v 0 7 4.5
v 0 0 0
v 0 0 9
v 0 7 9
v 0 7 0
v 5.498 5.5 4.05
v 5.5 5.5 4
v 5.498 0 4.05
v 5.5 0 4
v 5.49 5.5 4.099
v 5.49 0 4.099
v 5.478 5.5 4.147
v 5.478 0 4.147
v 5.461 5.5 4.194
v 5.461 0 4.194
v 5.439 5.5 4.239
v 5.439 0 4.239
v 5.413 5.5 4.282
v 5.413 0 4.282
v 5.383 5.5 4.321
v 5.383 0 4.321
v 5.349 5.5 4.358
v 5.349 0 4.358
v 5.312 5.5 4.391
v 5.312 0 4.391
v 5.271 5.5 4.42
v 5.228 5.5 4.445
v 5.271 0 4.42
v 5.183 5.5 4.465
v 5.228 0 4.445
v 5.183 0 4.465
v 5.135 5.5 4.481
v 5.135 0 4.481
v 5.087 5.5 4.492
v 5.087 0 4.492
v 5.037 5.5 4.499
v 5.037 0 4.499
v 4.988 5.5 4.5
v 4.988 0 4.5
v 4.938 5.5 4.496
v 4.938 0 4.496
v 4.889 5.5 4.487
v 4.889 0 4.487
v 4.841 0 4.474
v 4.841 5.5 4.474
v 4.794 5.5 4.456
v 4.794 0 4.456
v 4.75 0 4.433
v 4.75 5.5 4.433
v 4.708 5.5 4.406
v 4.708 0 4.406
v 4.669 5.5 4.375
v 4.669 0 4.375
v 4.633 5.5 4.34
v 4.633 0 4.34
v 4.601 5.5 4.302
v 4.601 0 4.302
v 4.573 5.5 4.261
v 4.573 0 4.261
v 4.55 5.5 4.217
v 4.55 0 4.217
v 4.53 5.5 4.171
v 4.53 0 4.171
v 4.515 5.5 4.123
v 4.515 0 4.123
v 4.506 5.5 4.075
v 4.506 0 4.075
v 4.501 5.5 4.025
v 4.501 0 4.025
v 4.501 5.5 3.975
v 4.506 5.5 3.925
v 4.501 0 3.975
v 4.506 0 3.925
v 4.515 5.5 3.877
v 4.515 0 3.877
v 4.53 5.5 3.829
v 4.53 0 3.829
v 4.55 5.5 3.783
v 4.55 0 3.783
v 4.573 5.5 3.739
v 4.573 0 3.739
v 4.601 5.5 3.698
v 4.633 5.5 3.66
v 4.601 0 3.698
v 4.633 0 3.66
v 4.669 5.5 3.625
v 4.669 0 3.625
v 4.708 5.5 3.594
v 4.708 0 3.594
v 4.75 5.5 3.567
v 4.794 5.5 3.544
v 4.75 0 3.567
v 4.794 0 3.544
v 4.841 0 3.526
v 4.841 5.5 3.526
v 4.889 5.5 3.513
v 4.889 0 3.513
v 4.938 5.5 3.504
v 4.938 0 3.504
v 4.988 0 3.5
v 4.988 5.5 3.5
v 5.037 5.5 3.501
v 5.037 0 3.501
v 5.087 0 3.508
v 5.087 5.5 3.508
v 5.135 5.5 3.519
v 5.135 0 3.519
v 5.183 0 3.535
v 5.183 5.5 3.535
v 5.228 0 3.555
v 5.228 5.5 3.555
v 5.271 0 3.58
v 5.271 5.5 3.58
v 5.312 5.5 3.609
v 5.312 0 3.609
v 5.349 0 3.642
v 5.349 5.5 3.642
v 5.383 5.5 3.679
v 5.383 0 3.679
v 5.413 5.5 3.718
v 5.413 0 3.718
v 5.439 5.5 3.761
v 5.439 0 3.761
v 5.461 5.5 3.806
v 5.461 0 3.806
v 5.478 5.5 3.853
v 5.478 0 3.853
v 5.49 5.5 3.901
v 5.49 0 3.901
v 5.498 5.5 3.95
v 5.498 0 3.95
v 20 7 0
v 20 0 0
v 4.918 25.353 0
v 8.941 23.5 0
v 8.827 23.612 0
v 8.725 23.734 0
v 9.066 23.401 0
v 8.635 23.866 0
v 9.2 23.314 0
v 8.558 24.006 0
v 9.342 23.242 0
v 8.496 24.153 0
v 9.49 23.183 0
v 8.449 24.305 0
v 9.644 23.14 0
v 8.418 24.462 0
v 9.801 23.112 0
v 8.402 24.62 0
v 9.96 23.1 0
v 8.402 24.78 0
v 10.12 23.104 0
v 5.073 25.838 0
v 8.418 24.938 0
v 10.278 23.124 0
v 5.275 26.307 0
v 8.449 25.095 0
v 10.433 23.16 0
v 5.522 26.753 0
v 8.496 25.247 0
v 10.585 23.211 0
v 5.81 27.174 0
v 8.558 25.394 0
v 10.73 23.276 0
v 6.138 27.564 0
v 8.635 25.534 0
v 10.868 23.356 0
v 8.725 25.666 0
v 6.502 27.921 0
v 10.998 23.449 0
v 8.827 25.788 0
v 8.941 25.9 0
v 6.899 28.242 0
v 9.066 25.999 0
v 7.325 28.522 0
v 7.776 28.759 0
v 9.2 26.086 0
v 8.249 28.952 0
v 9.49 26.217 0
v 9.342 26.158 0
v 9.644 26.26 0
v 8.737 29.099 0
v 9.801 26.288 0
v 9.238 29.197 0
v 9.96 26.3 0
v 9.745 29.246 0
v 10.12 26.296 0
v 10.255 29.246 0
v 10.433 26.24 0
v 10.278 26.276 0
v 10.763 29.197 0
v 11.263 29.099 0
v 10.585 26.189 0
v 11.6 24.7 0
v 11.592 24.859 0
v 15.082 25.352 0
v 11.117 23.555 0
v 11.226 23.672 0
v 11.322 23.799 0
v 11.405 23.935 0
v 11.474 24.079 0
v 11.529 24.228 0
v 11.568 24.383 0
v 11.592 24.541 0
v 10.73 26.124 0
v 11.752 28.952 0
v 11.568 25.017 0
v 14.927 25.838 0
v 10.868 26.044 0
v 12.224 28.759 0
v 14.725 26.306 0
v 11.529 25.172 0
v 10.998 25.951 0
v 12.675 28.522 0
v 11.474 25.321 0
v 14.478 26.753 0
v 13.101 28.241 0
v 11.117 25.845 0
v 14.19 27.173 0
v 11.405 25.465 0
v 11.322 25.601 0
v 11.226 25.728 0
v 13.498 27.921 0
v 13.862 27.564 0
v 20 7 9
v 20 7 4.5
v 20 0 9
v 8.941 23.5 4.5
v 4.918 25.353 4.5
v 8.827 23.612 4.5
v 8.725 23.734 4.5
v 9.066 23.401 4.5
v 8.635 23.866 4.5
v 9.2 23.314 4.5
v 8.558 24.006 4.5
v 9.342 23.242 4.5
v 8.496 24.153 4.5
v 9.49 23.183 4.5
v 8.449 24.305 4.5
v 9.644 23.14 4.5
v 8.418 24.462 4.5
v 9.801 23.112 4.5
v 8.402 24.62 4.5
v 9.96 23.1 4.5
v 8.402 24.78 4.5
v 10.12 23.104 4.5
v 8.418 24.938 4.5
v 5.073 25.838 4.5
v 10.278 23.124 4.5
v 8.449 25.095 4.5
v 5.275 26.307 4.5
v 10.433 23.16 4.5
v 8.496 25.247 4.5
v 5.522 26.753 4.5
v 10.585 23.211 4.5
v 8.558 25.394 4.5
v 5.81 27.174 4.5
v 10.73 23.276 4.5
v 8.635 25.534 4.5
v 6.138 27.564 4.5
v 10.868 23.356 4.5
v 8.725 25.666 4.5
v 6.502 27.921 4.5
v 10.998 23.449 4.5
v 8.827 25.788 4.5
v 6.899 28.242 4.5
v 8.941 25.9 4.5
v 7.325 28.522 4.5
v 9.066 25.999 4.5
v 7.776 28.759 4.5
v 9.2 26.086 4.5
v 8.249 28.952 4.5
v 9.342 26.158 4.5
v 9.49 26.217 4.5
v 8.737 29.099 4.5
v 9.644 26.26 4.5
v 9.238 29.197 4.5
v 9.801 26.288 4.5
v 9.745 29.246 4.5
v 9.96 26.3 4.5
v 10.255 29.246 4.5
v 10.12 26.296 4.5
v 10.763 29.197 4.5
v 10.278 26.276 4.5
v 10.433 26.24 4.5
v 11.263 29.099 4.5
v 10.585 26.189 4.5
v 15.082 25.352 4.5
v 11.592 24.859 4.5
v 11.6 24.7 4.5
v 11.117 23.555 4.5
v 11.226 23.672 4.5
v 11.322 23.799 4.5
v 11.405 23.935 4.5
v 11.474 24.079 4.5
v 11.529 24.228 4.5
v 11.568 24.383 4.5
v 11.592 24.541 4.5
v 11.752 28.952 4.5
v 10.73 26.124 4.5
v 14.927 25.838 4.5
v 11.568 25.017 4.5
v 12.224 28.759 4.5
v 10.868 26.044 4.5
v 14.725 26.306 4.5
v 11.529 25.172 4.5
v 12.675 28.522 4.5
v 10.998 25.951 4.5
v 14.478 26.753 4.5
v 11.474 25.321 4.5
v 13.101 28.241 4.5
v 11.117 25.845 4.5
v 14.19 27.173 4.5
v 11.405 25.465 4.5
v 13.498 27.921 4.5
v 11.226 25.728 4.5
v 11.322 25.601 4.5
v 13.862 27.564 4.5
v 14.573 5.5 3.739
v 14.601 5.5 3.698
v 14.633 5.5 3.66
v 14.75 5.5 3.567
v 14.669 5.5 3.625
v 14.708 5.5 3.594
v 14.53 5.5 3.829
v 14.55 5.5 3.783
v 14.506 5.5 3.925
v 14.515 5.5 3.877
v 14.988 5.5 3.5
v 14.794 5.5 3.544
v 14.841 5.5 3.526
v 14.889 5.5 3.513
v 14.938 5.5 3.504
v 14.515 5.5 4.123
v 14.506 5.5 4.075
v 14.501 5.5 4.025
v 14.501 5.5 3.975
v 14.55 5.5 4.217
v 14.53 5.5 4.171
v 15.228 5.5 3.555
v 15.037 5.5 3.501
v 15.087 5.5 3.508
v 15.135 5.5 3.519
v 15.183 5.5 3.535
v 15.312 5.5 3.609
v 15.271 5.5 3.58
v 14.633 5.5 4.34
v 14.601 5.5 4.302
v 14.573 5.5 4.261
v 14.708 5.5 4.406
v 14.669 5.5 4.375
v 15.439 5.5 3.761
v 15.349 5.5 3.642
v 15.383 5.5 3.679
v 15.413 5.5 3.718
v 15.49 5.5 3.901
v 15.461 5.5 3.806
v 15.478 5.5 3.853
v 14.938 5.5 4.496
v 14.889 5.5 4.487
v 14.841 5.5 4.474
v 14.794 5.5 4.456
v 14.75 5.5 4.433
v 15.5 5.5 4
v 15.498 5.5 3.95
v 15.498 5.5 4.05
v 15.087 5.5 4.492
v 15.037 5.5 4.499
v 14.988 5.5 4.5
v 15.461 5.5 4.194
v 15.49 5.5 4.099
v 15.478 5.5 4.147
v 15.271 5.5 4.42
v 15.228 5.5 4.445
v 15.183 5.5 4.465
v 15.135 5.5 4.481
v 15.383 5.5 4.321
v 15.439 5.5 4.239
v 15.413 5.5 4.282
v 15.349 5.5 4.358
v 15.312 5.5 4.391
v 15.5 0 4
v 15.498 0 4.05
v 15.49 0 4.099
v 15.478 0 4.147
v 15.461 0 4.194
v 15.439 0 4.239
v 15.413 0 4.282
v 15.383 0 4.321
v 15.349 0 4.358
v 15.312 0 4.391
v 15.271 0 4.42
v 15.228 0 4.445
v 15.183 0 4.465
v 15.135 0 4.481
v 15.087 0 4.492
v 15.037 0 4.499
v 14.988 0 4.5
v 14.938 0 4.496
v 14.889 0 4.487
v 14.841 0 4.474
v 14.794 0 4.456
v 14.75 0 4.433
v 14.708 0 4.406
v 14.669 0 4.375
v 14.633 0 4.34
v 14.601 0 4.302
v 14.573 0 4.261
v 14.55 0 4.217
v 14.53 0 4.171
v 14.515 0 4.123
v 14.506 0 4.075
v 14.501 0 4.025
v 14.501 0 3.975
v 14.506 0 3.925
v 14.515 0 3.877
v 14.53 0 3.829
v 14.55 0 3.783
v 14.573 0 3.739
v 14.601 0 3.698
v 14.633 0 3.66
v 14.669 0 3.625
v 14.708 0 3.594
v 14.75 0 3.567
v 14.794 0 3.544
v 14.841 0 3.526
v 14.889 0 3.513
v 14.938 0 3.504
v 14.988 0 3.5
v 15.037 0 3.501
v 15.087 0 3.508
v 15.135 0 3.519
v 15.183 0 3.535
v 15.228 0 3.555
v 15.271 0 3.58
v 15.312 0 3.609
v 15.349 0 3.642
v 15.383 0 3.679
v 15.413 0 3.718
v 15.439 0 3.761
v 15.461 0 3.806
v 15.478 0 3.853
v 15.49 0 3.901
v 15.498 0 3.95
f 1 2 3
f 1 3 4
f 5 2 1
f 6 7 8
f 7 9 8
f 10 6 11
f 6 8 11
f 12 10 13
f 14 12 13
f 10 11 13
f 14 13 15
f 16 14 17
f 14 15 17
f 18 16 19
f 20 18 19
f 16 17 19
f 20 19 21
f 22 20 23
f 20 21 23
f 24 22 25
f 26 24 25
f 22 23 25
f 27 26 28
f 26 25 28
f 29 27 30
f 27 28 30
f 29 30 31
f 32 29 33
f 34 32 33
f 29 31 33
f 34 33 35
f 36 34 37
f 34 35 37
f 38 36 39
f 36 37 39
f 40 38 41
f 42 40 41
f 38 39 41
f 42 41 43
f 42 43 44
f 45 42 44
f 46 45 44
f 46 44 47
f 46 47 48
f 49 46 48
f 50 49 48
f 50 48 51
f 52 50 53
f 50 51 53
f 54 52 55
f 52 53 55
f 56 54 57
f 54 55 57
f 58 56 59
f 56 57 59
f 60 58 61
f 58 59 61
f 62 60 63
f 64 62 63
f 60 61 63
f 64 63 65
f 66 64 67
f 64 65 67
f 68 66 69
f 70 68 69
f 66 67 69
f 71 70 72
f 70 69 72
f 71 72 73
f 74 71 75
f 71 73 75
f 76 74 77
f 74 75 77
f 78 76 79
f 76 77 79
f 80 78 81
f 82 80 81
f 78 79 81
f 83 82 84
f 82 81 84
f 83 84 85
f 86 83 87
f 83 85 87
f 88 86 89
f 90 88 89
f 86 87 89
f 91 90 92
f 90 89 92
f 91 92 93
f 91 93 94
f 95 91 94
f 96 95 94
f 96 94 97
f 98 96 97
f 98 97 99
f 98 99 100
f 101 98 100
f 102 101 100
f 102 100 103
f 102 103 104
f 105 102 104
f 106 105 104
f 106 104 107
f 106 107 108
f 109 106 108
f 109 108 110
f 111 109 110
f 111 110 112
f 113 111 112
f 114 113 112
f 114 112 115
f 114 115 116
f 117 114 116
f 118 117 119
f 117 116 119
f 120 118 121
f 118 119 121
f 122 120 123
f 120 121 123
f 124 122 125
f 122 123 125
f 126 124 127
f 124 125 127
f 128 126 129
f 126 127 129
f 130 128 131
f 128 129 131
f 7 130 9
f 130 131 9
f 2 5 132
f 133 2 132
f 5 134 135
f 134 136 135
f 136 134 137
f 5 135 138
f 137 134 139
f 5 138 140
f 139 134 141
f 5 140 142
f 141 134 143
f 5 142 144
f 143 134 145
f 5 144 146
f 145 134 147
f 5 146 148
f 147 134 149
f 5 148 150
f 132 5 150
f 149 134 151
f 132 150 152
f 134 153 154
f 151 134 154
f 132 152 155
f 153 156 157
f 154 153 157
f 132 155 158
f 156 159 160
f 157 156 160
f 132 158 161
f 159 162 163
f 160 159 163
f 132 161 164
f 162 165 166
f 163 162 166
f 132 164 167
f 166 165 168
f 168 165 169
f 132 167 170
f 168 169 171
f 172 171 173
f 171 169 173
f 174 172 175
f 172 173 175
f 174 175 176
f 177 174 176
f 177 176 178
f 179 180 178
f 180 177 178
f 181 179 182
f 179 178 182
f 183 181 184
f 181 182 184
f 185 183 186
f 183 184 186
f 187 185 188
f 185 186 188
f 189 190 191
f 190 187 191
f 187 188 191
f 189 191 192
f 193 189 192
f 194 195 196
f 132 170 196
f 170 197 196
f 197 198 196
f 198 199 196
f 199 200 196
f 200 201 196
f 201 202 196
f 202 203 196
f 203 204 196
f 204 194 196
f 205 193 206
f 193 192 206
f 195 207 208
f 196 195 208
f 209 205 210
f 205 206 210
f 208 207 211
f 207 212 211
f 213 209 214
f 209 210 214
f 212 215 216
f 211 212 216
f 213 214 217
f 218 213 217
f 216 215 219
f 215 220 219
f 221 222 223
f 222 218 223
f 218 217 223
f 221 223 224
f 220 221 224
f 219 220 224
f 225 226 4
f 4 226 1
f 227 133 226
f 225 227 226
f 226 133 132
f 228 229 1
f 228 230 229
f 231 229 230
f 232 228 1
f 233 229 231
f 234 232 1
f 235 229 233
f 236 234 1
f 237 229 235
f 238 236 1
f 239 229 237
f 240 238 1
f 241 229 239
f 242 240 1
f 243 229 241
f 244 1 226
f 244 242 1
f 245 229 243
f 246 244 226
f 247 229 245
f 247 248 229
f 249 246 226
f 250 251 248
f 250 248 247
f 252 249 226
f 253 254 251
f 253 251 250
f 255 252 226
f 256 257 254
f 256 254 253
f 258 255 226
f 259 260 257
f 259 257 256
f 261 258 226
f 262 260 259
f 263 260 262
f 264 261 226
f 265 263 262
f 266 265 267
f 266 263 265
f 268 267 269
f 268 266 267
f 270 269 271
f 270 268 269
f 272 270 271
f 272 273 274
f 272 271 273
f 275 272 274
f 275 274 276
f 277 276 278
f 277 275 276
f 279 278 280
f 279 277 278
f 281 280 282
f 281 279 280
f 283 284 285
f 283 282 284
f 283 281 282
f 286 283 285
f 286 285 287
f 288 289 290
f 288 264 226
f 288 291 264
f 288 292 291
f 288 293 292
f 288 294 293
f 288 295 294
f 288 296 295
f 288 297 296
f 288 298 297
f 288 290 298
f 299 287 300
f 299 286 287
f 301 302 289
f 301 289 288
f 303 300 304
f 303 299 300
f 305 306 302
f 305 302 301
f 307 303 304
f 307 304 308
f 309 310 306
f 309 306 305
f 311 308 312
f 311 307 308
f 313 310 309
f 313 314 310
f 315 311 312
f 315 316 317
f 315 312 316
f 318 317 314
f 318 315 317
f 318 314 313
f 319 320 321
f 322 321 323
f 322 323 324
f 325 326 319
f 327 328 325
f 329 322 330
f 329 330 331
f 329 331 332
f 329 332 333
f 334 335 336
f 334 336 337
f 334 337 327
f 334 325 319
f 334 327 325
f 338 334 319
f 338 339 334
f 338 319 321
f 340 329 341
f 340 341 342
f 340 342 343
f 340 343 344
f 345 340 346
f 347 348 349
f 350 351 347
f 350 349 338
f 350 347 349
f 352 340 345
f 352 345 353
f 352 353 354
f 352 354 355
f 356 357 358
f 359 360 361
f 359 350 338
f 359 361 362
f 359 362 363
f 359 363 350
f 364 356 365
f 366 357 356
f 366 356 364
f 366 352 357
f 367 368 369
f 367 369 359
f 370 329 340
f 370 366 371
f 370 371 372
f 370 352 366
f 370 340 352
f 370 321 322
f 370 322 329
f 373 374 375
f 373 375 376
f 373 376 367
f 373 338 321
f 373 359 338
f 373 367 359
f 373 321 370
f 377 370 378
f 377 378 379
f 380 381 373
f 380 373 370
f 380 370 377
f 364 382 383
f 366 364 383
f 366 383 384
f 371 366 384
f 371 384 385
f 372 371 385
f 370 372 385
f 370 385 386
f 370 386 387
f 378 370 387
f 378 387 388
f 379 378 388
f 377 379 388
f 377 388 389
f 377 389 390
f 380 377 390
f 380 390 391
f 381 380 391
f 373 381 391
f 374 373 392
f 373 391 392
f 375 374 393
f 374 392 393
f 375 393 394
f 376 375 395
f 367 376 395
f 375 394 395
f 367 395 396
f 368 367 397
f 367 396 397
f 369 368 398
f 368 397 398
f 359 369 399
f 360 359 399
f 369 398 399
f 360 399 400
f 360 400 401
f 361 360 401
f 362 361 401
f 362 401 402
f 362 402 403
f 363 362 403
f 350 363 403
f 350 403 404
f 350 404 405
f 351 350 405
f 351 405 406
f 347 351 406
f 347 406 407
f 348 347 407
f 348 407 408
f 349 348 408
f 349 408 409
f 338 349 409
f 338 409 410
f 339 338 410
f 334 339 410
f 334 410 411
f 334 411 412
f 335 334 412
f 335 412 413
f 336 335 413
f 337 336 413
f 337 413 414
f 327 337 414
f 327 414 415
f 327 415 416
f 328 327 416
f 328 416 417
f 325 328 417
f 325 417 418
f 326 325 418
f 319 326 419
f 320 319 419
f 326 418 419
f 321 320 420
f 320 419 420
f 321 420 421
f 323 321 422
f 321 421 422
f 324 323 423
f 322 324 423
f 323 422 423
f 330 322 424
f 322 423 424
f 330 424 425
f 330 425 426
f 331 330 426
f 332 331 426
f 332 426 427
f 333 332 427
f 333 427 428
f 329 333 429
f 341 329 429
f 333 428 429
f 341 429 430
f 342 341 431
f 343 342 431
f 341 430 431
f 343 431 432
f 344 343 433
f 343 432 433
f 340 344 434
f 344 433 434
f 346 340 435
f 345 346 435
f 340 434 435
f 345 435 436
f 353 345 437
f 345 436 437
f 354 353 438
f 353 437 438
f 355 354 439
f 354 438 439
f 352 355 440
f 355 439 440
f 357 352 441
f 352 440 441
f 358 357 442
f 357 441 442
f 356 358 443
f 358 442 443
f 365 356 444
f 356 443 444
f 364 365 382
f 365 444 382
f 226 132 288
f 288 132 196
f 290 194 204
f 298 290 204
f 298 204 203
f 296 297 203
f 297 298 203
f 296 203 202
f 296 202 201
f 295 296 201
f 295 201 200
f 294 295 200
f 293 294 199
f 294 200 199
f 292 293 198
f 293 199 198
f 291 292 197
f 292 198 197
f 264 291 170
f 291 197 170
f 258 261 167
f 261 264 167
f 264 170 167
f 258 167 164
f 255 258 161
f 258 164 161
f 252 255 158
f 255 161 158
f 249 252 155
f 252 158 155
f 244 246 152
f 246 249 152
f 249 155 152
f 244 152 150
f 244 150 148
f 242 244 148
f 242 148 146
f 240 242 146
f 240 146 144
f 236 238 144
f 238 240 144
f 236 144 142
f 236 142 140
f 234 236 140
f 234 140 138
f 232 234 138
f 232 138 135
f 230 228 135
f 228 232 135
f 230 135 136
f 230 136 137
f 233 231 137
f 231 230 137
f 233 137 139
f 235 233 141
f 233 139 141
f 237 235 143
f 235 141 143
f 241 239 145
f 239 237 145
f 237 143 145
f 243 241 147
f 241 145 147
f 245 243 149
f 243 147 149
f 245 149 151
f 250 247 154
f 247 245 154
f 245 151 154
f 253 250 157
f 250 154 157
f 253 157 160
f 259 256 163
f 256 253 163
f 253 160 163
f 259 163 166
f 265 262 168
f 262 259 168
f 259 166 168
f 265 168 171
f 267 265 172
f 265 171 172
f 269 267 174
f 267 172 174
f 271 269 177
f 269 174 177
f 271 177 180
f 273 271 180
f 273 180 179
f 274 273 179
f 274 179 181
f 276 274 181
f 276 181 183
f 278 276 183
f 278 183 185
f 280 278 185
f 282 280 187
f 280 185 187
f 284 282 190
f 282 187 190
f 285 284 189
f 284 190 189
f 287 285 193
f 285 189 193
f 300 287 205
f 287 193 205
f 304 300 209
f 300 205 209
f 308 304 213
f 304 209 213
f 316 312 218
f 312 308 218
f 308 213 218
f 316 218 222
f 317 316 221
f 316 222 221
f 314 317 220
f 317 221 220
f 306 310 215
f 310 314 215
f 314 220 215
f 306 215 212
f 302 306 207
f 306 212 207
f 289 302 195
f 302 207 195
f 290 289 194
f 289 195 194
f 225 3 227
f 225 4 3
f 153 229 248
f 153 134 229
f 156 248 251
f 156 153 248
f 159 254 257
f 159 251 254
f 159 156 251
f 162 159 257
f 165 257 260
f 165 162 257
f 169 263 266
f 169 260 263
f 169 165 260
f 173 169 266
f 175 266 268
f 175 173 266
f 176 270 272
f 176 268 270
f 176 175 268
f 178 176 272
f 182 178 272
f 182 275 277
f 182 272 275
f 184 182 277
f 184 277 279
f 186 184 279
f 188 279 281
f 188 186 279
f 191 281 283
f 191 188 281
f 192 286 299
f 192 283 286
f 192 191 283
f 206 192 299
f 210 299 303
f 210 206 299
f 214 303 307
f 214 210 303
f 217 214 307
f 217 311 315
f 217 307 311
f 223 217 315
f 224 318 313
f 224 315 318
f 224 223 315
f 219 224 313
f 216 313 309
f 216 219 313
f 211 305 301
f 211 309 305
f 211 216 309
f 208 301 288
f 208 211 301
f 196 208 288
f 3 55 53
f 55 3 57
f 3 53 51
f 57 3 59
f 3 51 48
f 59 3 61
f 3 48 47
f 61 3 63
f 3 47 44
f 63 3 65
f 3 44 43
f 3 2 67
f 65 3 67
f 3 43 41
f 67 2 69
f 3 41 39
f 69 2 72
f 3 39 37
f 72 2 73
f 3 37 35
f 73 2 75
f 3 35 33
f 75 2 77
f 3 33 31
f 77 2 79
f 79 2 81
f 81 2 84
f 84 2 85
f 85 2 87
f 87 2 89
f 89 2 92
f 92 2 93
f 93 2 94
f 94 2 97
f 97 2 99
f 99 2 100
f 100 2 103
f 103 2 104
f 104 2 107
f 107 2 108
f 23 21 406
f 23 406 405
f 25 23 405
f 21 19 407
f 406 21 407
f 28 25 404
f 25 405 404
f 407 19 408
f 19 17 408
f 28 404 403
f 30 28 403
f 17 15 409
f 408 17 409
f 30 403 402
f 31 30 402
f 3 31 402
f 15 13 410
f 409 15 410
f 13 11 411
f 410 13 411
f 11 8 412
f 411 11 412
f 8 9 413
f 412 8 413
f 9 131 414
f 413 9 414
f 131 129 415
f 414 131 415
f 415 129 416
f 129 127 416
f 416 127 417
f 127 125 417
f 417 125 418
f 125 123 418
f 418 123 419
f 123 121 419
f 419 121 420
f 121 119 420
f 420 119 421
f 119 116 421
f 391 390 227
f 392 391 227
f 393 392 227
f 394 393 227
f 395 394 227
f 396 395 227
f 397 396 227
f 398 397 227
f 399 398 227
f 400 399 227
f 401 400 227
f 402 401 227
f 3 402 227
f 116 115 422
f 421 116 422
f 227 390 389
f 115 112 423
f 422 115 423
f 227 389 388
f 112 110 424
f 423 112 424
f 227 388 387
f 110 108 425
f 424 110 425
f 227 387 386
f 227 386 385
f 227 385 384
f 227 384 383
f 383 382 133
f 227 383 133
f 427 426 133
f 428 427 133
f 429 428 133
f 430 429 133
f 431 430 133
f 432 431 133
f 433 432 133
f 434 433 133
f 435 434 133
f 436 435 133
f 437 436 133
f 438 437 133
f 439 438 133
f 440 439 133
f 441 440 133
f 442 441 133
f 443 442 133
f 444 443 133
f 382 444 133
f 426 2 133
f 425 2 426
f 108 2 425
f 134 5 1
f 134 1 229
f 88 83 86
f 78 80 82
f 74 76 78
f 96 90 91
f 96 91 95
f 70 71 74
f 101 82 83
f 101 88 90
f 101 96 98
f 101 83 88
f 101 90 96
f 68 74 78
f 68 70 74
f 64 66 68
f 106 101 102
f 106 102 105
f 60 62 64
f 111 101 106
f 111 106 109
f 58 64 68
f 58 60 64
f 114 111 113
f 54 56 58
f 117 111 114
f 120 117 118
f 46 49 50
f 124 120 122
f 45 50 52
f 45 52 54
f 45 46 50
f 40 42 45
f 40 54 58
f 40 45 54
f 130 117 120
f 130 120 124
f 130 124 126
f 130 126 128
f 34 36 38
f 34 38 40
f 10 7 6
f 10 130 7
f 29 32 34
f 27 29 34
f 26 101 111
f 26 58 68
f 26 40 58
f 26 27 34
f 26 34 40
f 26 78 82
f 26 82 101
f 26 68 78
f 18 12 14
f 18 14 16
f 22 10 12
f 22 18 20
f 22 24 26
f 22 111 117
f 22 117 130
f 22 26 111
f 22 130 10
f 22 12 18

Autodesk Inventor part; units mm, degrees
ref_plane "YZ Plane" through (0, 0, 0) normal (1, 0, 0) x (0, 1, 0)
ref_plane "XZ Plane" through (0, 0, 0) normal (0, 1, 0) x (-1, 0, 0)
ref_plane "XY Plane" through (0, 0, 0) normal (0, 0, 1) x (1, 0, 0)
sketch "Sketch1" plane through (0, 0, 0) normal (0, 0, 1) x (1, 0, 0)
  circle A0 centre (10, 24.7) radius 1.6
  line L0 (0, 0) -> (20.0001, 0)
  line L1 (0, 0) -> (0, 7)
  line L2 (20.0001, 0) -> (20.0001, 6.9998)
  line L3 (0, 7) -> (4.9176, 25.3526)
  line L4 (0, 7) -> (19, 7) construction
  line L5 (20.0001, 6.9998) -> (15.0825, 25.3524)
  line L6 (20.0001, 6.9998) -> (39.0001, 6.9998) construction
  arc A1 (15.0825, 25.3524) -> (4.9176, 25.3526) centre (10, 23.9906) ccw
  dimension "d17" = 7
  dimension "d18" = 6.9998
  dimension "d19" = 24.7
  dimension "d23" = 90
  dimension "d24" = 90
  dimension "d25" = 10
  dimension "d26" = 19
  dimension "d27" = 75
  dimension "d28" = 19
  dimension "d29" = 105
  dimension "d30" = 10
sketch "Sketch3" plane through (0, 0, 0) normal (0, 0, 1) x (1, 0, 0)
  point P0 (0, 0)
extrude "Extrusion1" add sketch "Sketch1" along normal blind 4.5
sketch "Sketch4" plane through (0, 0, 4.5) normal (0, 0, 1) x (1, 0, 0)
  line L0 (0, 7) -> (0, 0) projected
  line L1 (20.0001, 0) -> (20.0001, 6.9998) projected
  line L2 (0, 0) -> (20.0001, 0)
  line L3 (20.0001, 0) -> (20.0001, 6.9998)
  line L4 (3.884, 22.9404) -> (-0.0481, 7.0119) projected
  line L5 (20.0001, 6.9998) -> (0, 6.9998)
  line L6 (0, 7) -> (0, 0)
extrude "Extrusion2" add sketch "Sketch4" along normal blind 4.5
sketch "Sketch5" plane through (0, 0, 0) normal (0, -1, 0) x (1, 0, 0)
  circle A0 centre (5, 4) radius 0.5
  circle A1 centre (15, 4) radius 0.5
  line L0 (0, 0) -> (20.0001, 0) projected
  line L1 (0, 9) -> (20.0001, 9) projected
  dimension "d13" = 1
  dimension "d14" = 1
  dimension "d33" = 5
  dimension "d34" = 5
extrude "Extrusion3" cut sketch "Sketch5" against normal blind 5.5
properties part number "upper_deck_shaft_mount_for_AD"
